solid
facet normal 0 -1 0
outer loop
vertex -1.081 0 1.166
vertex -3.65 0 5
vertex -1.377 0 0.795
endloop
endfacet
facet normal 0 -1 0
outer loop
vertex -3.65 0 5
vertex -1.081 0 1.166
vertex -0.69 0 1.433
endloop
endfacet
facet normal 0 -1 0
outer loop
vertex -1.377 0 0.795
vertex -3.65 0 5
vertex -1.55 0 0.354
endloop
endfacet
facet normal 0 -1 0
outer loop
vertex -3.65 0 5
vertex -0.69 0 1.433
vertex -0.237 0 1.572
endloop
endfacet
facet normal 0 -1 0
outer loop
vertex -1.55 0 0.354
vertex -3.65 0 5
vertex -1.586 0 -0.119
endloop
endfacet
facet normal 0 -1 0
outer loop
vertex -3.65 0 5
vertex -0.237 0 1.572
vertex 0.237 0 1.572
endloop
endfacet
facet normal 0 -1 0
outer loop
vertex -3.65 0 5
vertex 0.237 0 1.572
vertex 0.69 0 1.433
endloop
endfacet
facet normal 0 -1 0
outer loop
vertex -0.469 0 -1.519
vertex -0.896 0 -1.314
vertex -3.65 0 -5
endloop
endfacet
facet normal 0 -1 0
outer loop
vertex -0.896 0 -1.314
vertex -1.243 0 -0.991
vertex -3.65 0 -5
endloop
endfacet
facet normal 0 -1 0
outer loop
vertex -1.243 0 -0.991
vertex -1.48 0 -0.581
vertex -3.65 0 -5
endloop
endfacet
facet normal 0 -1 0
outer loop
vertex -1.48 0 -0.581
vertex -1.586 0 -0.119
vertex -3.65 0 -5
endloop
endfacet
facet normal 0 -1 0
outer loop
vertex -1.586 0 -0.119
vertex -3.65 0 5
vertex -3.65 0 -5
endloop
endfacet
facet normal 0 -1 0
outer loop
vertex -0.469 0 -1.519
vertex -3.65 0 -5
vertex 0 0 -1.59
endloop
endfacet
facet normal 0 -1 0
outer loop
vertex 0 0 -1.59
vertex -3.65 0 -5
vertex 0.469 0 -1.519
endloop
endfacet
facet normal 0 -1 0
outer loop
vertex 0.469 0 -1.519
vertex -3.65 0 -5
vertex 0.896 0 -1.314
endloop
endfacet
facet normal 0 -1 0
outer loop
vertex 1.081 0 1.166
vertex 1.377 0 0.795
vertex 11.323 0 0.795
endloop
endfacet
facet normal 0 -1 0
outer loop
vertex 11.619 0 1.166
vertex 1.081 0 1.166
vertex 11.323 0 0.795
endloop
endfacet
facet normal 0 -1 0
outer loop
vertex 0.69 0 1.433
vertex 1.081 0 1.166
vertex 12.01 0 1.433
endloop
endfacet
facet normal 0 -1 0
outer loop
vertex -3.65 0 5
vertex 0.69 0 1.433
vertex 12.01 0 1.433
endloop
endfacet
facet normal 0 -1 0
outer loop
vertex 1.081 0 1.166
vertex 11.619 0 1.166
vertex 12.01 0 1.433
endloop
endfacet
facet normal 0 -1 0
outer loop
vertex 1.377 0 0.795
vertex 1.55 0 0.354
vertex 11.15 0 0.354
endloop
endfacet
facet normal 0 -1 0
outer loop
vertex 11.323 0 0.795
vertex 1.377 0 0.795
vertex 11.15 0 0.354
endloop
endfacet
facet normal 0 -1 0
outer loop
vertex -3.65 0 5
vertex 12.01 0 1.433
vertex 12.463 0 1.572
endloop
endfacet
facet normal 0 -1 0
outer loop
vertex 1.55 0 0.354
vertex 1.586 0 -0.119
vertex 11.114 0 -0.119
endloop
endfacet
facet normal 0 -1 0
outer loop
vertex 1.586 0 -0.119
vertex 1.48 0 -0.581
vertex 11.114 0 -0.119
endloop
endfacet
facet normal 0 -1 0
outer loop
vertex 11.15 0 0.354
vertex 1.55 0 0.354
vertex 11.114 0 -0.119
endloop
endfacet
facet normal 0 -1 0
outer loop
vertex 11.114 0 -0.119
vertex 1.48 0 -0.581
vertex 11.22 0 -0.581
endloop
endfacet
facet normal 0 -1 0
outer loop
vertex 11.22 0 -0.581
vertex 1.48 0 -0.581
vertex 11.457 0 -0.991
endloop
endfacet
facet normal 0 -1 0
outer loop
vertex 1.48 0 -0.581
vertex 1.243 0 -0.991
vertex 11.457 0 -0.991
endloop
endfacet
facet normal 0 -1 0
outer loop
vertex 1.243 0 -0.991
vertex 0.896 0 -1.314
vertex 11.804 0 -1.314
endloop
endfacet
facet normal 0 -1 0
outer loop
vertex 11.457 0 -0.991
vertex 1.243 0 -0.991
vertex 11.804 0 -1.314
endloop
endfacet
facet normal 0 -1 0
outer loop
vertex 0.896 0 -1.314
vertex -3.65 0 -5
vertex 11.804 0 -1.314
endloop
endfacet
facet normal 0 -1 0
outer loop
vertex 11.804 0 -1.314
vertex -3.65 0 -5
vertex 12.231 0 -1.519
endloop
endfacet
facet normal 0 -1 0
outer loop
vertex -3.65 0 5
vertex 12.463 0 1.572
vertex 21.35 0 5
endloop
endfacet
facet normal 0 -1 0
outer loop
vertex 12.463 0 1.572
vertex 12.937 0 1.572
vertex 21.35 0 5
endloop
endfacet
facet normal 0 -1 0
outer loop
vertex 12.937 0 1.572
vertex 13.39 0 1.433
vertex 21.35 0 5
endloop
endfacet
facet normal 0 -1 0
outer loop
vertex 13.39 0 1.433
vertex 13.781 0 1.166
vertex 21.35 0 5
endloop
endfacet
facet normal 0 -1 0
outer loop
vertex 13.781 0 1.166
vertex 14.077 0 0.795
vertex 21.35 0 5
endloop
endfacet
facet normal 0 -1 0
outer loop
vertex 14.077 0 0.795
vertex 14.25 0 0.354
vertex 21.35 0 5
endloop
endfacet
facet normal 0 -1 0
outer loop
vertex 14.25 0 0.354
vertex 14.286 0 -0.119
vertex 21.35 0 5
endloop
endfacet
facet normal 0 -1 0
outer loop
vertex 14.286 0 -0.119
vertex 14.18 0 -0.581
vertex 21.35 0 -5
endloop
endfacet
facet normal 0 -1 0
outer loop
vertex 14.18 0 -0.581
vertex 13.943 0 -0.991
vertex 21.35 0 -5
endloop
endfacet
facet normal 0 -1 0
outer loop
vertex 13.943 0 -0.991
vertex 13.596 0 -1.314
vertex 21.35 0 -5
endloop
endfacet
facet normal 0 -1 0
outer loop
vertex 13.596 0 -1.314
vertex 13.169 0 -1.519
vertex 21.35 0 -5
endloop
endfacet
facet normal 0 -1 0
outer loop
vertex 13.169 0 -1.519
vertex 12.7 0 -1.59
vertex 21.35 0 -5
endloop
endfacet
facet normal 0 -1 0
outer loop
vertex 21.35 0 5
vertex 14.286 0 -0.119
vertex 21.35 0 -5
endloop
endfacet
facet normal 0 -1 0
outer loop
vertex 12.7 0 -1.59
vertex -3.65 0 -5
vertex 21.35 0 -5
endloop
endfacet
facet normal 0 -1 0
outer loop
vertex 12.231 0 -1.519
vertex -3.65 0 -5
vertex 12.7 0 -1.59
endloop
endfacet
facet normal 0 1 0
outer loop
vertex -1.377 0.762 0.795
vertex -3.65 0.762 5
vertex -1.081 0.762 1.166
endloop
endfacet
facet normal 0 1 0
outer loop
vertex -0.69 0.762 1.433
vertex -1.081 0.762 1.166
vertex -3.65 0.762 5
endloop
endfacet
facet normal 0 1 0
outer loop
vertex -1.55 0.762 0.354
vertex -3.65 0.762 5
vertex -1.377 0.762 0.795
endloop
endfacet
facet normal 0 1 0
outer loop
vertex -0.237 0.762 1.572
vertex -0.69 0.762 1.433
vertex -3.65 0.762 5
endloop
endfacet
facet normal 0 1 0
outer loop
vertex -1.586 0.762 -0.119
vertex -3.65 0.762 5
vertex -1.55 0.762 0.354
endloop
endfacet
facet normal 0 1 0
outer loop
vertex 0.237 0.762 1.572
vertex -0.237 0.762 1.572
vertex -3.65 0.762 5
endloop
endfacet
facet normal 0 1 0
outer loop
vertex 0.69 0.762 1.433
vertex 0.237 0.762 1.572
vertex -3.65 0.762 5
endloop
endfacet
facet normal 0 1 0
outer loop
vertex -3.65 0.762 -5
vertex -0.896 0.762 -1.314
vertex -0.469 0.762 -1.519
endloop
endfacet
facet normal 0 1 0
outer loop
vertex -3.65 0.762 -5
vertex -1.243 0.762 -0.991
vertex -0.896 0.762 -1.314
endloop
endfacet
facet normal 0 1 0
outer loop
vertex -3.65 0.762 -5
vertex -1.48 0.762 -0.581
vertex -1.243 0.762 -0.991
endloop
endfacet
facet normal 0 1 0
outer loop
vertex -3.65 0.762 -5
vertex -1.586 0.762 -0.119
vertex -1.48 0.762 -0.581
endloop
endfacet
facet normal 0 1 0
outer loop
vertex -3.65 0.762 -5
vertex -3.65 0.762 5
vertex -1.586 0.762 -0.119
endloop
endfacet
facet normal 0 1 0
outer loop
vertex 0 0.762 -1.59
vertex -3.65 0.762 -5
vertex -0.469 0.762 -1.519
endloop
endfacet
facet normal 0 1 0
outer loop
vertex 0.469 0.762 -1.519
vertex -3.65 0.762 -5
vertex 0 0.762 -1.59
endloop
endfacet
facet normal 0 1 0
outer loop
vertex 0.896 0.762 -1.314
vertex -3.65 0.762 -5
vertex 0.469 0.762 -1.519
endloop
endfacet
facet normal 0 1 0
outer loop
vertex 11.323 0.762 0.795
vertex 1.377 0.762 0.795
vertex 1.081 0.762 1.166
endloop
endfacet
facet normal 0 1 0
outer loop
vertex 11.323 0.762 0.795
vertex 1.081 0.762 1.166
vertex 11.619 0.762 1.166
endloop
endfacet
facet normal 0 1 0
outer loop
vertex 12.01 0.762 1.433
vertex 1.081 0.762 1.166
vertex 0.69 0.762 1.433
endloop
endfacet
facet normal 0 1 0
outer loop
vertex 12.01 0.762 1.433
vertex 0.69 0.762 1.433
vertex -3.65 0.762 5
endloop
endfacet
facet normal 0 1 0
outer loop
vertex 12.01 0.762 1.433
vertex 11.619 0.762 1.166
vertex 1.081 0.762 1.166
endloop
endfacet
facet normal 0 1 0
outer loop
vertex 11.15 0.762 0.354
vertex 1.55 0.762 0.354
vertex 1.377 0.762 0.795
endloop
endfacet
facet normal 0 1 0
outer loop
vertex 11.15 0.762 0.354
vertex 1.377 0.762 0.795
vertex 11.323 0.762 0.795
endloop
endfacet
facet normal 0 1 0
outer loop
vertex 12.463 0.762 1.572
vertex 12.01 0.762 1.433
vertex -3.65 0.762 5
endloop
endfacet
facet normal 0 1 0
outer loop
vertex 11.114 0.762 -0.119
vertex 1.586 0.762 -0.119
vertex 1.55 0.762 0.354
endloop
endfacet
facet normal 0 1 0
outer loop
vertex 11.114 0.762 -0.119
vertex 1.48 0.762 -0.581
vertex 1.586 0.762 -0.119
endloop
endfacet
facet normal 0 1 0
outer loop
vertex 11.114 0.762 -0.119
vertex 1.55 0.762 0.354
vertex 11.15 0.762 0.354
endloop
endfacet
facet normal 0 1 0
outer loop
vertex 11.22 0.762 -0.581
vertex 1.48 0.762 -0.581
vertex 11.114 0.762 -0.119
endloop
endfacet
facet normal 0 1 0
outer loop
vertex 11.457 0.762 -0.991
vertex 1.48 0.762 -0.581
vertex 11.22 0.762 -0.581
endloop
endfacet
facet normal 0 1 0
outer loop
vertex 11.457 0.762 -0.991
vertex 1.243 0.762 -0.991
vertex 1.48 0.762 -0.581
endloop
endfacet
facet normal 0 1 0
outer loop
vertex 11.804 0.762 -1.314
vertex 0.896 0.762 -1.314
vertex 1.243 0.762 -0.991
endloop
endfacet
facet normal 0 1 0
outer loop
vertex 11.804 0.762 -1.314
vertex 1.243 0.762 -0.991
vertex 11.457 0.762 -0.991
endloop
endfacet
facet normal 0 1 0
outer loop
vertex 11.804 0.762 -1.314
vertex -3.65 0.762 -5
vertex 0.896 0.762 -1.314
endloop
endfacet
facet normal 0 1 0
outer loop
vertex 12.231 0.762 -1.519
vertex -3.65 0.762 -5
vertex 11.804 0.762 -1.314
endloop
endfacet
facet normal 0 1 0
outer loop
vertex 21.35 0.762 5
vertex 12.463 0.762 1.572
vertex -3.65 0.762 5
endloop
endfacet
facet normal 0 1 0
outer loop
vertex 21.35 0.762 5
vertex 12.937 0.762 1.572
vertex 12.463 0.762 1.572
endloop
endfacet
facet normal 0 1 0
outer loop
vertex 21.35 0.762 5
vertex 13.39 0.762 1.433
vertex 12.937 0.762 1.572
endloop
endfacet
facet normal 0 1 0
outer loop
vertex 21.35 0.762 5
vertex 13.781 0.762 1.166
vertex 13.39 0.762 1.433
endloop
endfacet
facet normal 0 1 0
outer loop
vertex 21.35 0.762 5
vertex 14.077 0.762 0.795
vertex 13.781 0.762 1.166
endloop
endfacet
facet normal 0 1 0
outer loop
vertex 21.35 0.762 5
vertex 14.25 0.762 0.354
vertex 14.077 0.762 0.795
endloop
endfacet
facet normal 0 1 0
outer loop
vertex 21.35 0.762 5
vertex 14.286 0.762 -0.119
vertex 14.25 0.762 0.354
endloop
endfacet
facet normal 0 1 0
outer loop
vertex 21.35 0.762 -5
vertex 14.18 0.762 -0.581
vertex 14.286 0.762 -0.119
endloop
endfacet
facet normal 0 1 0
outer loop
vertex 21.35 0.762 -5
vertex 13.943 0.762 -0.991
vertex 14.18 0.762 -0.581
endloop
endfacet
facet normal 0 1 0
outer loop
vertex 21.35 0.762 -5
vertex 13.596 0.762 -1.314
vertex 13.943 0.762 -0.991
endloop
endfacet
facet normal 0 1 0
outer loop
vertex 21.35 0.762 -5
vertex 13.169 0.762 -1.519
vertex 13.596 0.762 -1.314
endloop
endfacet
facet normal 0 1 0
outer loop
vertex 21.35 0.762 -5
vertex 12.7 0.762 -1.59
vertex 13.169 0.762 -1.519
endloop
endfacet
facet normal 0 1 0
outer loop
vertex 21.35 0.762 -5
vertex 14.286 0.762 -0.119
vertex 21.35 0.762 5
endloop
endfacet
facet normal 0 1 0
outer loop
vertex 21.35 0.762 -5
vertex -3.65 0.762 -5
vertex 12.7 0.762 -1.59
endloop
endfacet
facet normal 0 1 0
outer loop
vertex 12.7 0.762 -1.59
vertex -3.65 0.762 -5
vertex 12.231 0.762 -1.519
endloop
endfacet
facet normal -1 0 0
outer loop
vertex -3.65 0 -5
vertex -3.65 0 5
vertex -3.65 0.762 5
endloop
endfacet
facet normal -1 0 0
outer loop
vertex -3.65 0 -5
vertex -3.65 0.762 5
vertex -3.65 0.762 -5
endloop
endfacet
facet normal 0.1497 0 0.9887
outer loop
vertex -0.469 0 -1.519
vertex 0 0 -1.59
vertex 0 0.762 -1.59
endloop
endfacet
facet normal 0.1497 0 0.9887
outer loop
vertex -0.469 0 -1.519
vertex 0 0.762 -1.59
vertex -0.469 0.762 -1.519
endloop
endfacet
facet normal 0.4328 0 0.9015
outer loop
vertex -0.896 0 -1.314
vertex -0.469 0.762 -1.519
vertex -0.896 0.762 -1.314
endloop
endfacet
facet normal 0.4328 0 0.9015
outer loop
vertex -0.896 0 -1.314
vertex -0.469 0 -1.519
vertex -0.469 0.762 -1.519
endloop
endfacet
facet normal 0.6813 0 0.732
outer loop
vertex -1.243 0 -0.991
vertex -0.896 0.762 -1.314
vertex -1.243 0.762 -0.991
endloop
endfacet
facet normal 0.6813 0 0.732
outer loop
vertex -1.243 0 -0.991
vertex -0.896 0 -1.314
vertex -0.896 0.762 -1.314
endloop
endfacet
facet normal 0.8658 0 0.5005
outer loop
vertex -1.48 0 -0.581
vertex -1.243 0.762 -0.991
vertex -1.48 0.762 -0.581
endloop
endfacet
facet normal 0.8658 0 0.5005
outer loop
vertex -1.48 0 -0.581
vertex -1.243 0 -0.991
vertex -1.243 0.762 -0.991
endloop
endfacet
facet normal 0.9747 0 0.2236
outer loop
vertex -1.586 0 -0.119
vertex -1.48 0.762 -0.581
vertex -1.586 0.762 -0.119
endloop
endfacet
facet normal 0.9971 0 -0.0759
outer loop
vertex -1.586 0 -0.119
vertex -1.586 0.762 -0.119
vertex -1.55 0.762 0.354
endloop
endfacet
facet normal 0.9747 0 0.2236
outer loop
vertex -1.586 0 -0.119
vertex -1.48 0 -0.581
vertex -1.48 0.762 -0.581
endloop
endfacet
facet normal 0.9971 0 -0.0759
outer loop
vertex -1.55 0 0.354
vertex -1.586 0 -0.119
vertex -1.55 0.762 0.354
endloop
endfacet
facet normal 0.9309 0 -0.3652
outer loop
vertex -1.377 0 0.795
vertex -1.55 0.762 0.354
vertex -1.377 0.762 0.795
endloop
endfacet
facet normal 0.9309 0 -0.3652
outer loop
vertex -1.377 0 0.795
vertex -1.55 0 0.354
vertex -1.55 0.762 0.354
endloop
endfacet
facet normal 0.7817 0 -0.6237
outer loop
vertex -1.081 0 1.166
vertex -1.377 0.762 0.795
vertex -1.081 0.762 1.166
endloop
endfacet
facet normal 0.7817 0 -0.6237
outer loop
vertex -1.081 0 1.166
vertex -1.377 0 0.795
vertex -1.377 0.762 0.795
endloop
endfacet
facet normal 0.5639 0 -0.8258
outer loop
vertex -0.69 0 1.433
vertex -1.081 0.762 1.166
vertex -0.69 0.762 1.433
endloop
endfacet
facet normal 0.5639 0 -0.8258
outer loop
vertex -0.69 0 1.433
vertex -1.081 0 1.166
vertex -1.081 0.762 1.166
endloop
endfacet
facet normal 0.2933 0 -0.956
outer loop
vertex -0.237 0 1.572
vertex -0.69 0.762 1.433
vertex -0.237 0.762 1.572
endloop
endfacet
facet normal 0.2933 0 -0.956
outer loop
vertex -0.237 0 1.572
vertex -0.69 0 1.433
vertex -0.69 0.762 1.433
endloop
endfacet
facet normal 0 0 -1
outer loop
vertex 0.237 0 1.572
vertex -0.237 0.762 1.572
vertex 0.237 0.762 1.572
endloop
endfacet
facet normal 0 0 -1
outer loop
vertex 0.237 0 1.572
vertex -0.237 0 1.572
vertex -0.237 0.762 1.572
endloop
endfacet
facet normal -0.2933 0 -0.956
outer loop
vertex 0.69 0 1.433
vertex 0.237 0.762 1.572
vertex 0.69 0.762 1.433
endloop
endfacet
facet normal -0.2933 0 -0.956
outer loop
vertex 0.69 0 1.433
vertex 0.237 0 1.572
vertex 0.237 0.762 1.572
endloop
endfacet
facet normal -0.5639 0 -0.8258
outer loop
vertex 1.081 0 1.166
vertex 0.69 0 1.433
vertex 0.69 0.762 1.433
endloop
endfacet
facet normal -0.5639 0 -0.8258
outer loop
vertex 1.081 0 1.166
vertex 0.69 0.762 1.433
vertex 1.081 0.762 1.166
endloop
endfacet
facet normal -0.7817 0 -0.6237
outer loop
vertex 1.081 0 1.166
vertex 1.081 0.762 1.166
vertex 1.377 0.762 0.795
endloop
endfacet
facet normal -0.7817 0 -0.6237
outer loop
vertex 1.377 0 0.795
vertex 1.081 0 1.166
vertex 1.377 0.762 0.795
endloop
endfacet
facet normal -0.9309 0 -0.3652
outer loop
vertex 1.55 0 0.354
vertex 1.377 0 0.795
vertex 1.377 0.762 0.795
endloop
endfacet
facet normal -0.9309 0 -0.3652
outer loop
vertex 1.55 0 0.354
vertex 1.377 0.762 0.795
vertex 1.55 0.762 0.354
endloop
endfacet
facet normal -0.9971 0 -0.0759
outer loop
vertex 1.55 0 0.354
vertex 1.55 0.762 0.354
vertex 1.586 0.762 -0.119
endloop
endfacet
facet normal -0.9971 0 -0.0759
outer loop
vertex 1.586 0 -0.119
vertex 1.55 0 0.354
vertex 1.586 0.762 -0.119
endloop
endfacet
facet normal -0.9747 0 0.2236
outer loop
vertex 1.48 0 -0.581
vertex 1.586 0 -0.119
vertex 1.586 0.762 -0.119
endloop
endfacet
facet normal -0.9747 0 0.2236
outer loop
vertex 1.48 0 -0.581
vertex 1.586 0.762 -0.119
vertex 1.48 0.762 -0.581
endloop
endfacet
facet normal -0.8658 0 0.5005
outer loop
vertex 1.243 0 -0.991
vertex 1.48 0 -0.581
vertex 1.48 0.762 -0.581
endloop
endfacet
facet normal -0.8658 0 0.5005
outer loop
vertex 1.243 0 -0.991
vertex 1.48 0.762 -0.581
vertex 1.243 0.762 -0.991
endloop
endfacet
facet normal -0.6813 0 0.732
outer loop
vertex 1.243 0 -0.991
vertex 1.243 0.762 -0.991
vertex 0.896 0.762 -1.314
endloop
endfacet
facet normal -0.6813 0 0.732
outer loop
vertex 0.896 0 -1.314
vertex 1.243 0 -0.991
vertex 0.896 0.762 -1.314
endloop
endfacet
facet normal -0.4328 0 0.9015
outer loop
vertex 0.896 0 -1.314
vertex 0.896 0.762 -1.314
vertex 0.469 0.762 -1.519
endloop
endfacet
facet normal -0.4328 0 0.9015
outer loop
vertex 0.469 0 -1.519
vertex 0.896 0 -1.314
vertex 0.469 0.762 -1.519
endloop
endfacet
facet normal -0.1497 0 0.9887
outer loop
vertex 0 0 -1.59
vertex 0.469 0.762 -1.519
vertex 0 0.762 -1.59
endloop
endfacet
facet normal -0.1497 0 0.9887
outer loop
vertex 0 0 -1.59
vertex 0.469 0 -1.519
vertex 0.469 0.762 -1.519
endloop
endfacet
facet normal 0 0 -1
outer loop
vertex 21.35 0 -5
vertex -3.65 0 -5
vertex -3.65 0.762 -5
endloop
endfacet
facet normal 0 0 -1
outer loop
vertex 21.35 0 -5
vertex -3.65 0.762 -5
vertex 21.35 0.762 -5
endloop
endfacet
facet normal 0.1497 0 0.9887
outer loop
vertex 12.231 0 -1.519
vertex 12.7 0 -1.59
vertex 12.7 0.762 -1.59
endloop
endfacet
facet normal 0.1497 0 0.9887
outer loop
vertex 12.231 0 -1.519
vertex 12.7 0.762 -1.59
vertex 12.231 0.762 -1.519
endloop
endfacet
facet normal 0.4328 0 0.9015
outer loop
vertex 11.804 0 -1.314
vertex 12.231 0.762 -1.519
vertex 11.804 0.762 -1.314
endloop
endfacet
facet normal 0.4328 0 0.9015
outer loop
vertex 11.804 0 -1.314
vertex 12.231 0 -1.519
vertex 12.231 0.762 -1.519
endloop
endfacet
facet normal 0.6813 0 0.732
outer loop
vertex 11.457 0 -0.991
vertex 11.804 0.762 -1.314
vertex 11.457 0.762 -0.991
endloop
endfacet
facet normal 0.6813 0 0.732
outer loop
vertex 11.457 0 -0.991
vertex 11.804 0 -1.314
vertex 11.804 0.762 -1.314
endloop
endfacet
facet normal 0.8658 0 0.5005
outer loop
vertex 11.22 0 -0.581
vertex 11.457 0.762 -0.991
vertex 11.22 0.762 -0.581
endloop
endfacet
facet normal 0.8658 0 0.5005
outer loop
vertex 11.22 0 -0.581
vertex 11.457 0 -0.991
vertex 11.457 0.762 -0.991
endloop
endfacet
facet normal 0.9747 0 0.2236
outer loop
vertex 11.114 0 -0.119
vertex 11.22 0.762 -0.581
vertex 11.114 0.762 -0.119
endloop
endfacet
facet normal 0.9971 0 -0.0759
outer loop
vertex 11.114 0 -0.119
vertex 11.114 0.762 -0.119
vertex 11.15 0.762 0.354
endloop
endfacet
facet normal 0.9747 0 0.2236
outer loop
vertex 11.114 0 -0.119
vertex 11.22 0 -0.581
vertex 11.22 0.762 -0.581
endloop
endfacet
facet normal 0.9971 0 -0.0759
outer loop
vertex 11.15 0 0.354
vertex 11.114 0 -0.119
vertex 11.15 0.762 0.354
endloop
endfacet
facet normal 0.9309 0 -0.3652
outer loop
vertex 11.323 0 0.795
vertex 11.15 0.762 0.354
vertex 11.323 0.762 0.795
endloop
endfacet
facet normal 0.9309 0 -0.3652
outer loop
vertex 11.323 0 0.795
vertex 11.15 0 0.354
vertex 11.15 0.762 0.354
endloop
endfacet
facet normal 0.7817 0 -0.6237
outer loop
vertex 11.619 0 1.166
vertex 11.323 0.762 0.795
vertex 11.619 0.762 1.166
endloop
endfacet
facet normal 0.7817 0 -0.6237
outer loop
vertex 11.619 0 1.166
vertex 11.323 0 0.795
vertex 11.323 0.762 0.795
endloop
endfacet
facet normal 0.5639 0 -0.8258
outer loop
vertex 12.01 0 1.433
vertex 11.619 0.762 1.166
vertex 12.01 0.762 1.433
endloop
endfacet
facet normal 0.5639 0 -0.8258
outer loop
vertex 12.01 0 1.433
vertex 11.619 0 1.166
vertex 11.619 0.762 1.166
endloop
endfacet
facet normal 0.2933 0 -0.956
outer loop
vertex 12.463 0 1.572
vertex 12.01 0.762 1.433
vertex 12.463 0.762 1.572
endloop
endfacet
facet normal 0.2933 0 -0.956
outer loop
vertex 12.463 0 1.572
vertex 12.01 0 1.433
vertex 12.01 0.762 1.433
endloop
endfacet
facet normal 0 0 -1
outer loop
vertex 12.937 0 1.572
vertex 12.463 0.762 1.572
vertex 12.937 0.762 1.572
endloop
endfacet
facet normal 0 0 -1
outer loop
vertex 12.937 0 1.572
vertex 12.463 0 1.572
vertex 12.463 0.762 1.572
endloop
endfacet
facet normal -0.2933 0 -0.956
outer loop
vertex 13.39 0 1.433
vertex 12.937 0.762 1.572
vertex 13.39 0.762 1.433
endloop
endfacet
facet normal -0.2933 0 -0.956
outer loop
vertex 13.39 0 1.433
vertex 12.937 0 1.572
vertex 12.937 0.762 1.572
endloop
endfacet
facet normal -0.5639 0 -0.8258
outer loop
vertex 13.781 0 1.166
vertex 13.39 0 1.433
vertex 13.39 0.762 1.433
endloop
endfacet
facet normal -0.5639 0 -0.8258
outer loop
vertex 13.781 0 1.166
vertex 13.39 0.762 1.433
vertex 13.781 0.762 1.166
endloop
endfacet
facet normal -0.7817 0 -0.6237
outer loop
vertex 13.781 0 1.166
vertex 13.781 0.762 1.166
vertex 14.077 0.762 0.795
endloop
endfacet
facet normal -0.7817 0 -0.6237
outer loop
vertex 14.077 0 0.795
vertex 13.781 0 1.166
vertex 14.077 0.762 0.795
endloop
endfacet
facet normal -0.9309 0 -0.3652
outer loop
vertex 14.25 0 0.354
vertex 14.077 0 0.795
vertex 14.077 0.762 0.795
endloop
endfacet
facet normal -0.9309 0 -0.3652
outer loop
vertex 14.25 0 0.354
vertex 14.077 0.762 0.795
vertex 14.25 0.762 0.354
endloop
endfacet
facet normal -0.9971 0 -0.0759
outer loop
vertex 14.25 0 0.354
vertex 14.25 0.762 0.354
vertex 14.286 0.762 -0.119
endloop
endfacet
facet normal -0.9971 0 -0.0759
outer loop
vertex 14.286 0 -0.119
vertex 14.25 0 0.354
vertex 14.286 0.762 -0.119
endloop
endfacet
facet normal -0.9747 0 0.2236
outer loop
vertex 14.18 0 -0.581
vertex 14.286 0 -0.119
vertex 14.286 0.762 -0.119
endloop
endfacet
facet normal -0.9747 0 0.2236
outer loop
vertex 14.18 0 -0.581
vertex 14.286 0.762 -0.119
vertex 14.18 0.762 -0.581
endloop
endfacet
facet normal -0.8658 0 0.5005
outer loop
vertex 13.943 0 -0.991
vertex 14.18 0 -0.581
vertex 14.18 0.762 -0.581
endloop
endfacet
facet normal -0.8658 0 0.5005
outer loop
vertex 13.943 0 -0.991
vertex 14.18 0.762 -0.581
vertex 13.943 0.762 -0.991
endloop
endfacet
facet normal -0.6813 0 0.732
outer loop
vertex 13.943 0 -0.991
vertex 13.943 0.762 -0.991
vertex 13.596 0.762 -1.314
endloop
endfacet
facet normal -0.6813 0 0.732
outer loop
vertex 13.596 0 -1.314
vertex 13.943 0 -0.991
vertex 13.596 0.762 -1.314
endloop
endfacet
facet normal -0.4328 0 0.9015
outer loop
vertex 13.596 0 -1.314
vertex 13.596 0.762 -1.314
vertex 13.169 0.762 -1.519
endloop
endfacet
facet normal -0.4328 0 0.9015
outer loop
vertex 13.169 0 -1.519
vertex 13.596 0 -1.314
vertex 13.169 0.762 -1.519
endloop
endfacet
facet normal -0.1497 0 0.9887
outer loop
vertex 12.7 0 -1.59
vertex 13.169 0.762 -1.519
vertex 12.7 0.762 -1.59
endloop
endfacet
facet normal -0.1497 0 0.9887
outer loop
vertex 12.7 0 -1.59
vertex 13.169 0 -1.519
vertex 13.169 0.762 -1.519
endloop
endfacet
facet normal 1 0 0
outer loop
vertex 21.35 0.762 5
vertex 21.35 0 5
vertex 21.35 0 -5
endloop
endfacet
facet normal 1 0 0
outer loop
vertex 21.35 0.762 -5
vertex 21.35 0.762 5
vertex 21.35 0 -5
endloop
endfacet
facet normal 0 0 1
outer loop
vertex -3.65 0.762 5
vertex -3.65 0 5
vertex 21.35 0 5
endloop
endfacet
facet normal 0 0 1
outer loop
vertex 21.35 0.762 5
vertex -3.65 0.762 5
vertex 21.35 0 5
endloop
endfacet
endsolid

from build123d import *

# Parameters (mm, degrees)
SKETCH1_W           = 20
SKETCH1_H           = 10
SKETCH1_R           = 1.59
SKETCH1_W_2         = 5
BOSS_EXTRUDE1_DEPTH = 0.762


with BuildPart() as part:
    # Sketch1 → Boss-Extrude1 (new body)
    # profile 1 of 2: a face of its own
    with BuildSketch(Plane(origin=(0, 0, 0), x_dir=(1, 0, 0), z_dir=(0, 1, 0))):
        with Locations((6.35, 0)):
            Rectangle(SKETCH1_W, SKETCH1_H)
        with Locations(Location((0, 0, 0), (0, 0, 90))):
            Circle(SKETCH1_R, mode=Mode.SUBTRACT)
        with Locations(Location((12.7, 0, 0), (0, 0, 90))):
            Circle(SKETCH1_R, mode=Mode.SUBTRACT)
    # profile 2 of 2: a face of its own
    with BuildSketch(Plane(origin=(0, 0, 0), x_dir=(1, 0, 0), z_dir=(0, 1, 0))):
        with Locations((18.85, 0)):
            Rectangle(SKETCH1_W_2, SKETCH1_H)
    extrude(amount=BOSS_EXTRUDE1_DEPTH)


solid = part.part
